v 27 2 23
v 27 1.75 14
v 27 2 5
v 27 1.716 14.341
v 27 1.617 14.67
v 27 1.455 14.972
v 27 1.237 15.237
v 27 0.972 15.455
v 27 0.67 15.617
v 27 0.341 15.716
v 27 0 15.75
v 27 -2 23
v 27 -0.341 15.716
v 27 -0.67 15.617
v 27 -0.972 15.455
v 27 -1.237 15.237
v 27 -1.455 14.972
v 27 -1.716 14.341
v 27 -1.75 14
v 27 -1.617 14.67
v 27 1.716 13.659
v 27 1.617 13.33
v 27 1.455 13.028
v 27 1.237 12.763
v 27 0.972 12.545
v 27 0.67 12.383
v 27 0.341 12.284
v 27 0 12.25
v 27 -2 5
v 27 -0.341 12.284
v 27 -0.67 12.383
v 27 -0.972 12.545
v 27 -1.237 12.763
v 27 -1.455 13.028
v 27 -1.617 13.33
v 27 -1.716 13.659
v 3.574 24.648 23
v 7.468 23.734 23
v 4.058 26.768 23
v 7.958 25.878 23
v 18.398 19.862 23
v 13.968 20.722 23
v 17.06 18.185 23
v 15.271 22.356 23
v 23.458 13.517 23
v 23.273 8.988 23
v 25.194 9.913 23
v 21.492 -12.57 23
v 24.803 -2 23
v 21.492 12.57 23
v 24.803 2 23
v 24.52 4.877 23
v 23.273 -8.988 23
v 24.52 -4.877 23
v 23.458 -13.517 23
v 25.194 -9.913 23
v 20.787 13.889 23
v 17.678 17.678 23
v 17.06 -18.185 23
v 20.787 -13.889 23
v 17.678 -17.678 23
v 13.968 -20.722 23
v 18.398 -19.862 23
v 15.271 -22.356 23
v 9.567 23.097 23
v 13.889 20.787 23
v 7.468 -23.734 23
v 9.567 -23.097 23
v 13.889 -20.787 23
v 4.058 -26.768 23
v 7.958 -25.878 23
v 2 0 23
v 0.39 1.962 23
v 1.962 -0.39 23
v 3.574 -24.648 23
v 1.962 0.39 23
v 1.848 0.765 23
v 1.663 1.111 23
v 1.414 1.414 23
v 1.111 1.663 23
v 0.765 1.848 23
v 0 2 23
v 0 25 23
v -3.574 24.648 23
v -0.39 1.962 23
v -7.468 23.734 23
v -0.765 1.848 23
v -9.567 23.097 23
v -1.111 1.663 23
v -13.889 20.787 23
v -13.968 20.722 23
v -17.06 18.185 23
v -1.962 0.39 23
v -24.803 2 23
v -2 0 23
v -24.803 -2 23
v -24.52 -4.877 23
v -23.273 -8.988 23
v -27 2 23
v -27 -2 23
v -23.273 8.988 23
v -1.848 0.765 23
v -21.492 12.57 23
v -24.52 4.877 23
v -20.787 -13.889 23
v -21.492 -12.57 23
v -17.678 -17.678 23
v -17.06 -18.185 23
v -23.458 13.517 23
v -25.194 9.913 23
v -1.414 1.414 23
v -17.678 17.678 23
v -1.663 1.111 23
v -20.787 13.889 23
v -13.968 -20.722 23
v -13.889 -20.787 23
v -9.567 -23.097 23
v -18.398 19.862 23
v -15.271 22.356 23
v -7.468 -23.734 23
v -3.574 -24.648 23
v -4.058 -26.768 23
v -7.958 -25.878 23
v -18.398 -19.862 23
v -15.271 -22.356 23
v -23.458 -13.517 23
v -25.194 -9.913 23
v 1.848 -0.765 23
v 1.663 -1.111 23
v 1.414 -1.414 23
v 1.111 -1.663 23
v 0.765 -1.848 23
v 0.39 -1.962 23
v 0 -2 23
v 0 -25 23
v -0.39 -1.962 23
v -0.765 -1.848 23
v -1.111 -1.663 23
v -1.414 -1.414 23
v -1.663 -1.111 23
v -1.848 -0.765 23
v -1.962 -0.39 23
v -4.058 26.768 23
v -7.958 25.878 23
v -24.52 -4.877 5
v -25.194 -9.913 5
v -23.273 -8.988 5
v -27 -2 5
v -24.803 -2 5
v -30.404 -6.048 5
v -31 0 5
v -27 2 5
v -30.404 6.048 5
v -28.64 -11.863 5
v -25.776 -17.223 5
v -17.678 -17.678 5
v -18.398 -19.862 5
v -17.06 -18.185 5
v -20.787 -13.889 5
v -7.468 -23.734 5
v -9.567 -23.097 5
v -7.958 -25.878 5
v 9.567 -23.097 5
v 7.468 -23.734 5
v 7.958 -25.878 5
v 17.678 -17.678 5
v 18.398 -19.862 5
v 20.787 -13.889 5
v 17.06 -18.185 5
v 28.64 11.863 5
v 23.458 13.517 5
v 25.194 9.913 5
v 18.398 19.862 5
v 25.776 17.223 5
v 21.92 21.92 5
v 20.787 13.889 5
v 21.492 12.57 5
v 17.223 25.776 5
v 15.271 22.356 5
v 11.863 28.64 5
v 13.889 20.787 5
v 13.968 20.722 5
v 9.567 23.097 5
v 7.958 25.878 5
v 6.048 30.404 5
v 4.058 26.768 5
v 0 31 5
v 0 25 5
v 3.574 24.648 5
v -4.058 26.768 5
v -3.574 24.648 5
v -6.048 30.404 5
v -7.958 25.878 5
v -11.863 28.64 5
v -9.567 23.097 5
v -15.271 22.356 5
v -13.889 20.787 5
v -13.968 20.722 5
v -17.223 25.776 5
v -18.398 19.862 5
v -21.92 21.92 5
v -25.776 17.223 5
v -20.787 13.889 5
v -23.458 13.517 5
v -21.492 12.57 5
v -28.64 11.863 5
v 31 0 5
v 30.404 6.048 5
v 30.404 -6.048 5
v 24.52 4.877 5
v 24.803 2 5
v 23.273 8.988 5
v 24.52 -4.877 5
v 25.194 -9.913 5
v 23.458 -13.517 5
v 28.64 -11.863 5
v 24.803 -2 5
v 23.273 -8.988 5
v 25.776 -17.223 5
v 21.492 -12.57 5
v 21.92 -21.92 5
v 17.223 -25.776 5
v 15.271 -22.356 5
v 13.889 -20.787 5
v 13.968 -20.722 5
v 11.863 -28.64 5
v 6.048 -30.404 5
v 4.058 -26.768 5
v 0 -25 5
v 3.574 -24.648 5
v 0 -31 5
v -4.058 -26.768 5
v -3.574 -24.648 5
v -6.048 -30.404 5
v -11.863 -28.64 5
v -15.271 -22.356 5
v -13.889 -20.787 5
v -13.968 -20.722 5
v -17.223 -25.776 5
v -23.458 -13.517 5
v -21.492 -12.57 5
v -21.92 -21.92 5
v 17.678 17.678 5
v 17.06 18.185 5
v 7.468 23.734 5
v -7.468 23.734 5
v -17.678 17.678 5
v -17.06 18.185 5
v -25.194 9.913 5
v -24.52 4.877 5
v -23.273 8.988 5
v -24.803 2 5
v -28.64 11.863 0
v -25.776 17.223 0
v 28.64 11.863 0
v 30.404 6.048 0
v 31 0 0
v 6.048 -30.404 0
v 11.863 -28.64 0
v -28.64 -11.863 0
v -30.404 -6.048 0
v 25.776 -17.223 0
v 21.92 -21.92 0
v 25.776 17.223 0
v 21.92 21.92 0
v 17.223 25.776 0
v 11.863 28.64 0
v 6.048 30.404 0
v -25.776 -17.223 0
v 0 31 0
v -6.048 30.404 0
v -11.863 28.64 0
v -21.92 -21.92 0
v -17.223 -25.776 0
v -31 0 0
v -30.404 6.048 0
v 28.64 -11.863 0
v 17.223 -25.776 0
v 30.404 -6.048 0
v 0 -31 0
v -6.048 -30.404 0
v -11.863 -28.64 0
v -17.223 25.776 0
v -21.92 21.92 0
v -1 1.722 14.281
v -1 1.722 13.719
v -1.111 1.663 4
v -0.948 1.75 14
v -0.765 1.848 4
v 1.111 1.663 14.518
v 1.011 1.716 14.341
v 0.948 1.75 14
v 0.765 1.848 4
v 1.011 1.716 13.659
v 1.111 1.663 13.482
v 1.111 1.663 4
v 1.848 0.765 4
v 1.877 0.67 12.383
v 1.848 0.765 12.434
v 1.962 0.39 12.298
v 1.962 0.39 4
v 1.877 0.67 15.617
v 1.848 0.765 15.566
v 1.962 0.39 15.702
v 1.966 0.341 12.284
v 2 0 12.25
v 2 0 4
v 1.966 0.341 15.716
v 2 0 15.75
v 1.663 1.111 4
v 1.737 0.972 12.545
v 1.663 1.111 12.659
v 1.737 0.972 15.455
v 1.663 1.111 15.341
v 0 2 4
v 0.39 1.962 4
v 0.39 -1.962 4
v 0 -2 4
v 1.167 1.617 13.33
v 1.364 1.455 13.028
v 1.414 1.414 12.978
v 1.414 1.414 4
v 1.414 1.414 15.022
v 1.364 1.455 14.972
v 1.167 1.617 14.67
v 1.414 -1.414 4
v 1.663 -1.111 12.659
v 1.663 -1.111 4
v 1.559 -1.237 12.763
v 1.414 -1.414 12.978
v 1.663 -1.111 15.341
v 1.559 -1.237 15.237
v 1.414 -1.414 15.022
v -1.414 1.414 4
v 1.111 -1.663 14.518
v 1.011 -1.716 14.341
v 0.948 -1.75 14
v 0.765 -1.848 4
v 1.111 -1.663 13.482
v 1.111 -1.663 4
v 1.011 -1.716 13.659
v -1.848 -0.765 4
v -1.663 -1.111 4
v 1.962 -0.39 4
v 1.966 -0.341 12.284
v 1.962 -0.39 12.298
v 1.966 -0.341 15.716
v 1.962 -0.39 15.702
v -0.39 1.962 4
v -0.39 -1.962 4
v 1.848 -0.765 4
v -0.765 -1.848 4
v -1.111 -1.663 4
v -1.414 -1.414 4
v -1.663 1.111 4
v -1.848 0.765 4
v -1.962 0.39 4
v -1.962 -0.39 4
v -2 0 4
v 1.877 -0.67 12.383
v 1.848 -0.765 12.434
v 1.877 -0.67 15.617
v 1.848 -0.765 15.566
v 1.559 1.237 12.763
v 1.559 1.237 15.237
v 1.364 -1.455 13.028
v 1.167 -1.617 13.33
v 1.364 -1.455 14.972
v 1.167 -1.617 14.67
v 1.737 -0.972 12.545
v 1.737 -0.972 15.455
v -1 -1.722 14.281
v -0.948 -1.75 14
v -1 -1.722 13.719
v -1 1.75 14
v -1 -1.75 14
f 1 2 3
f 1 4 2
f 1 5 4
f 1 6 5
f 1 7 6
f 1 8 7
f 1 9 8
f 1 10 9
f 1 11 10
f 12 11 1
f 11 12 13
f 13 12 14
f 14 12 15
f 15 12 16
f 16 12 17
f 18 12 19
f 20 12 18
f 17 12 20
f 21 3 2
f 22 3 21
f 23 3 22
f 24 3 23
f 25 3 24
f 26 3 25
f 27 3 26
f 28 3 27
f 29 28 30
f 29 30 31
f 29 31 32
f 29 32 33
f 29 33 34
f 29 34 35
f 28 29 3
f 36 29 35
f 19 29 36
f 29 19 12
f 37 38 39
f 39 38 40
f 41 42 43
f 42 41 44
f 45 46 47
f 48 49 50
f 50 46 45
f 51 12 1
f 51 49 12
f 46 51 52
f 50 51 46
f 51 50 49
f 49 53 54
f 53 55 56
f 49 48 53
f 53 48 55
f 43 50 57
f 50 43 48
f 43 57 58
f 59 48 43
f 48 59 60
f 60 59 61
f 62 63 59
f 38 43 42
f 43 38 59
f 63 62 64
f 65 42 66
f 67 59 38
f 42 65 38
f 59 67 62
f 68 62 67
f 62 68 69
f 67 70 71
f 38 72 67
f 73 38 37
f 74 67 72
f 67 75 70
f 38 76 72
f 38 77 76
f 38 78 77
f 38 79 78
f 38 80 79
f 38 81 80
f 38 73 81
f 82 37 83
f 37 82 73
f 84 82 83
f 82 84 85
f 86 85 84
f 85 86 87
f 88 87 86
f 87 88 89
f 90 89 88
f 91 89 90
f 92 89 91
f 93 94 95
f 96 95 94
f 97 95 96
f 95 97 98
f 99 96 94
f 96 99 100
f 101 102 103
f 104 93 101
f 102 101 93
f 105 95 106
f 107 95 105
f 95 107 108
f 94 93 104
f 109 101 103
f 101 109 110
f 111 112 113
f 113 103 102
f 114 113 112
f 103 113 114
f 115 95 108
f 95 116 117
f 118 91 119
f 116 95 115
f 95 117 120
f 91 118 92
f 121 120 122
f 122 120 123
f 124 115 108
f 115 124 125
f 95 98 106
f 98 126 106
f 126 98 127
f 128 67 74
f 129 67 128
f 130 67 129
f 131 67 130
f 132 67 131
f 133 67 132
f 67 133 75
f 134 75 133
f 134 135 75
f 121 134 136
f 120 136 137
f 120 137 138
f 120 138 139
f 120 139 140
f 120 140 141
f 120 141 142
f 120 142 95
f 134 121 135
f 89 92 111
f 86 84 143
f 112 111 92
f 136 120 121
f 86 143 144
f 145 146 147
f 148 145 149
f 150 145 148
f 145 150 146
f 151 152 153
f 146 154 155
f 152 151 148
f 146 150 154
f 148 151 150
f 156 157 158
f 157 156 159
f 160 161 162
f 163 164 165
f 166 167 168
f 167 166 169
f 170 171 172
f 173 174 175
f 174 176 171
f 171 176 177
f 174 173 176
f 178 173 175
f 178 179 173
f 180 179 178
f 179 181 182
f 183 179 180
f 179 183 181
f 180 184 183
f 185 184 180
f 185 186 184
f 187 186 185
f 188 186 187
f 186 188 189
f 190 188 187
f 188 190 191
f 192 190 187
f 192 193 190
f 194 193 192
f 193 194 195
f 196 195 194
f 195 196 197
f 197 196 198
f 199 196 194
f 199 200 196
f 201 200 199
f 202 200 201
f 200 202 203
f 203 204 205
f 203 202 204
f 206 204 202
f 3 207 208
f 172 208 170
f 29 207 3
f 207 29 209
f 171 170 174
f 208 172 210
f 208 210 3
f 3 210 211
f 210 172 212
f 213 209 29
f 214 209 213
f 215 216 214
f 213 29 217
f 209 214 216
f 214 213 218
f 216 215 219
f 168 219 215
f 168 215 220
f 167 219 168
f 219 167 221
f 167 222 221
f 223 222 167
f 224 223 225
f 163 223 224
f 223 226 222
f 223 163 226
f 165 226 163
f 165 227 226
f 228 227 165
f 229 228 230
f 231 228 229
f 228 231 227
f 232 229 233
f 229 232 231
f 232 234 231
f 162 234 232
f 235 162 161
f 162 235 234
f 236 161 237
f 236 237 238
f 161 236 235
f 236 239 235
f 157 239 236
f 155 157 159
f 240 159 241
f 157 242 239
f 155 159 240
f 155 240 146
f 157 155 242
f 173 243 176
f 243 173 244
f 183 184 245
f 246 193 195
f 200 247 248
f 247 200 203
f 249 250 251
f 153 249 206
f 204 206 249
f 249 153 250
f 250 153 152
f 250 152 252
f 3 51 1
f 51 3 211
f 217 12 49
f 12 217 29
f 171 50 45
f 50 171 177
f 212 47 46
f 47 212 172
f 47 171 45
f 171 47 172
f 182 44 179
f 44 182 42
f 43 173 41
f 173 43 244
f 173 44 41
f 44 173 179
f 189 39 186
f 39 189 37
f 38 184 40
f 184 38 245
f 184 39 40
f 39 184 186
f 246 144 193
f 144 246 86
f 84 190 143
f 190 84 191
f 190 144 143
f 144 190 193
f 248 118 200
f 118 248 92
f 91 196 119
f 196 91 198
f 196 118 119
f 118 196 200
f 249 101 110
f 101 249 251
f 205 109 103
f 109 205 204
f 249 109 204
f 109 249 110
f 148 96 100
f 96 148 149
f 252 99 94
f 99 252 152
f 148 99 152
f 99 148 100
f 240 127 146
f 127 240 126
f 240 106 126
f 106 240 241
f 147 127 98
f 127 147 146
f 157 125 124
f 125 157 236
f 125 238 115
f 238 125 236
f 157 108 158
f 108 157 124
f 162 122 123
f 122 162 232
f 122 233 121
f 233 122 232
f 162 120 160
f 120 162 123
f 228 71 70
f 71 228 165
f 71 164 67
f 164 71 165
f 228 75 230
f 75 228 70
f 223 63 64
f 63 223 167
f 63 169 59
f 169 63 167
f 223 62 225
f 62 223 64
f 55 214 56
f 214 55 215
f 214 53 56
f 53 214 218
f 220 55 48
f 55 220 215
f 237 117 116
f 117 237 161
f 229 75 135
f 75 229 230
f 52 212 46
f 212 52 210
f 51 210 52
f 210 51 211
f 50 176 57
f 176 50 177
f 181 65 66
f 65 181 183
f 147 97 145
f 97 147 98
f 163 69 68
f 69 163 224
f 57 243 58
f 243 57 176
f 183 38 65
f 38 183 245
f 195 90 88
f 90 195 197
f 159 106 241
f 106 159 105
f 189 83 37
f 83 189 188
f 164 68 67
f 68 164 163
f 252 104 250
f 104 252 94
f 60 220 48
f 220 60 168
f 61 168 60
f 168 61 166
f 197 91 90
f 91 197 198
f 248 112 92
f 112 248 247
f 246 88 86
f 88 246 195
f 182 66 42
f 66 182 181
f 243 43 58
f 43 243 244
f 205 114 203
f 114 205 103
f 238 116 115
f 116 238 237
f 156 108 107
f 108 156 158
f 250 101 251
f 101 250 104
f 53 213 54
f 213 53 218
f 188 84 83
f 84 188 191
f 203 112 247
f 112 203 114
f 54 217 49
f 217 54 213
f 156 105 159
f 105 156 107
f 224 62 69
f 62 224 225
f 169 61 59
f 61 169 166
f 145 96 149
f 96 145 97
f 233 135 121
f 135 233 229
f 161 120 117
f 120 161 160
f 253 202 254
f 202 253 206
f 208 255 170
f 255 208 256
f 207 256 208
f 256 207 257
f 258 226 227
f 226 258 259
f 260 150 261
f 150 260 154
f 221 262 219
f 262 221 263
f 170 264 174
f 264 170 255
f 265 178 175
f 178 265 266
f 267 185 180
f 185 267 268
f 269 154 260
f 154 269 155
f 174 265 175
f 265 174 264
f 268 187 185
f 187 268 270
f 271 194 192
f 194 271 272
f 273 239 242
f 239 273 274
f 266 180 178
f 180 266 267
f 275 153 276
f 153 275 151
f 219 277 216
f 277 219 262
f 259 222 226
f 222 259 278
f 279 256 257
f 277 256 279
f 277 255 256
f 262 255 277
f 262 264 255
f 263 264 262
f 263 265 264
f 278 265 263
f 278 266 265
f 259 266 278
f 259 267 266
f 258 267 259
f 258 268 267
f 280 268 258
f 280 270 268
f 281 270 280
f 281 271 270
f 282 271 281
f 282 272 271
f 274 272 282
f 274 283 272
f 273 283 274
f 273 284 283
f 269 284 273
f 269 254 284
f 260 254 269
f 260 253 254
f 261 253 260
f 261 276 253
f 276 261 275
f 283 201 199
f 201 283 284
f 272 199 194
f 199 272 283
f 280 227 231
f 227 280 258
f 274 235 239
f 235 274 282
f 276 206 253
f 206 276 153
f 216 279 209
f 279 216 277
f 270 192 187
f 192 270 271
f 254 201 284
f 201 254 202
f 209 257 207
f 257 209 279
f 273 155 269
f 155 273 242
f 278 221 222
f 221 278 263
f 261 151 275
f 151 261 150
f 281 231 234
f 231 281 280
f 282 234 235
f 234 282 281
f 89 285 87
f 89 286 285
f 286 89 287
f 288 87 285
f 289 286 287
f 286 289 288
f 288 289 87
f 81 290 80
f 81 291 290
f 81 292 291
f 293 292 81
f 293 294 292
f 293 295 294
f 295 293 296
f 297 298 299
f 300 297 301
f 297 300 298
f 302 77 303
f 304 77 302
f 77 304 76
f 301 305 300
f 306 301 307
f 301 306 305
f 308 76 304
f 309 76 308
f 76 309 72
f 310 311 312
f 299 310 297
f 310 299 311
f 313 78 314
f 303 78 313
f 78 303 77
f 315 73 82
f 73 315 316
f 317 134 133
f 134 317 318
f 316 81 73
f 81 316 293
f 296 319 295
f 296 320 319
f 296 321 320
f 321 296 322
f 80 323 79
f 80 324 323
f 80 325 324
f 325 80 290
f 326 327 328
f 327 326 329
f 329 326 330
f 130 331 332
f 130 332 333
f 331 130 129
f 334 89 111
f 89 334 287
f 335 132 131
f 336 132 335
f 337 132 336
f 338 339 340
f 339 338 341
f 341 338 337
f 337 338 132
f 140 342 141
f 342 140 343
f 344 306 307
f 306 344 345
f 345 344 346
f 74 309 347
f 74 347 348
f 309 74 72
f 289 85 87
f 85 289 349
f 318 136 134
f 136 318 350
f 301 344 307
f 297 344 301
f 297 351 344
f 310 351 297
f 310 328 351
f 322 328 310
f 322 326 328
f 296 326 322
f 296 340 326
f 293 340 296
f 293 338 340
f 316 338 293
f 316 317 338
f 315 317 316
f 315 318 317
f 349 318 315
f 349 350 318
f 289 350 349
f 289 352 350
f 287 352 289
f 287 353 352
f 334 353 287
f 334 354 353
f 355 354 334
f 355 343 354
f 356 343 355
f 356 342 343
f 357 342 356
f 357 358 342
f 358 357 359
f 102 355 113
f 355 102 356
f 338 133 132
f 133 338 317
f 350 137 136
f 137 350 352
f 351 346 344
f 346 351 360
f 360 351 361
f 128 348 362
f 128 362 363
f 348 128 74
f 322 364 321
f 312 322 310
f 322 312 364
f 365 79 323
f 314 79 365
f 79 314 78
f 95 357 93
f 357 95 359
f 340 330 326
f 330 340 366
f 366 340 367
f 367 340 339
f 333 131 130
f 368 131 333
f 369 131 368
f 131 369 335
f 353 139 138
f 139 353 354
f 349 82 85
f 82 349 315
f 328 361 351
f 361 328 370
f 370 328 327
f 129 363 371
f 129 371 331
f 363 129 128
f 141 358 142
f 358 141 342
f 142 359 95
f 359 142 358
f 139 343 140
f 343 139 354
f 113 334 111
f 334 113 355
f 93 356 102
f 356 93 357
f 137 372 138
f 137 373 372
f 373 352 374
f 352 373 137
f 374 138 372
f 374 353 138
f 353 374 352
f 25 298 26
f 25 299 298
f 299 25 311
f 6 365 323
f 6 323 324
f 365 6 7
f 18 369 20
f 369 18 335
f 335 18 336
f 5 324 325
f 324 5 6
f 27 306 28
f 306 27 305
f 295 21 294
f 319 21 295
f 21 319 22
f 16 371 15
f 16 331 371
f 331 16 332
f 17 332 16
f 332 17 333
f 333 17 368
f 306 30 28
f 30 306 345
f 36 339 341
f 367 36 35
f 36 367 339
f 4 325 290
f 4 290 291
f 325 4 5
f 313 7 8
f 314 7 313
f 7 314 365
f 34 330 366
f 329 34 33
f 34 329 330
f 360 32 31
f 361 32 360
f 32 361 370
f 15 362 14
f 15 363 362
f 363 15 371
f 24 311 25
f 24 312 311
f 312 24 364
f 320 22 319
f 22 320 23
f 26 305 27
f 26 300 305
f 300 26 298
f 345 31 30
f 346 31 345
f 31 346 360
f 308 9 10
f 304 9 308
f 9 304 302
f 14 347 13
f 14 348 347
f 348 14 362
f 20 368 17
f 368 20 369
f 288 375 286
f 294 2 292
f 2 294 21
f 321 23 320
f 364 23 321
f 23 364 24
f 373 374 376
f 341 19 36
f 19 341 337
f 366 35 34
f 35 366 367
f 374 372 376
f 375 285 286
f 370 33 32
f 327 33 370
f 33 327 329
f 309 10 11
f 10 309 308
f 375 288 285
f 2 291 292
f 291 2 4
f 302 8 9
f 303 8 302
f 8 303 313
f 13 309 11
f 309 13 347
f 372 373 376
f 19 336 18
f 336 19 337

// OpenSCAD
$fn = 32;

// ----------------------------------------------------------------------
// Control knob: skirt knob with grip ribs
// ----------------------------------------------------------------------

// --- parameters (mm) ---
skirt_d = 62;             // skirt diameter
skirt_t = 5;              // skirt thickness
rib_w = 4;                // grip rib width
rib_out = 3;              // grip rib radial protrusion
n_ribs = 14;              // number of grip ribs
knob_d = 50;              // knob body diameter
knob_h = 18;              // knob body height
bore_d = 4;               // shaft bore diameter
set_d = 3.5;              // set screw bore diameter
fit_tol = 0.1;            // tolerance for press fits, mm
free_tol = 0.3;           // tolerance for clearance fits, mm

rib_step = 360 / n_ribs;  // rib angular step
total_h = skirt_t + knob_h;  // overall height

difference() {
  union() {
    translate([0, 0, skirt_t]) cylinder(h = knob_h, d = knob_d);
    cylinder(h = skirt_t, d = skirt_d);
    for (i = [0 : n_ribs - 1])
      rotate([0, 0, i * rib_step])
        translate([knob_d / 2 - 1, -rib_w / 2, skirt_t])
          cube([rib_out, rib_w, knob_h]);
  }
  translate([0, 0, skirt_t - 1]) cylinder(h = knob_h + 2, d = bore_d);
  translate([-1, 0, skirt_t + knob_h / 2]) rotate([0, 90, 0])
    cylinder(h = knob_d / 2 + bore_d / 2 + 2, d = set_d);
}
